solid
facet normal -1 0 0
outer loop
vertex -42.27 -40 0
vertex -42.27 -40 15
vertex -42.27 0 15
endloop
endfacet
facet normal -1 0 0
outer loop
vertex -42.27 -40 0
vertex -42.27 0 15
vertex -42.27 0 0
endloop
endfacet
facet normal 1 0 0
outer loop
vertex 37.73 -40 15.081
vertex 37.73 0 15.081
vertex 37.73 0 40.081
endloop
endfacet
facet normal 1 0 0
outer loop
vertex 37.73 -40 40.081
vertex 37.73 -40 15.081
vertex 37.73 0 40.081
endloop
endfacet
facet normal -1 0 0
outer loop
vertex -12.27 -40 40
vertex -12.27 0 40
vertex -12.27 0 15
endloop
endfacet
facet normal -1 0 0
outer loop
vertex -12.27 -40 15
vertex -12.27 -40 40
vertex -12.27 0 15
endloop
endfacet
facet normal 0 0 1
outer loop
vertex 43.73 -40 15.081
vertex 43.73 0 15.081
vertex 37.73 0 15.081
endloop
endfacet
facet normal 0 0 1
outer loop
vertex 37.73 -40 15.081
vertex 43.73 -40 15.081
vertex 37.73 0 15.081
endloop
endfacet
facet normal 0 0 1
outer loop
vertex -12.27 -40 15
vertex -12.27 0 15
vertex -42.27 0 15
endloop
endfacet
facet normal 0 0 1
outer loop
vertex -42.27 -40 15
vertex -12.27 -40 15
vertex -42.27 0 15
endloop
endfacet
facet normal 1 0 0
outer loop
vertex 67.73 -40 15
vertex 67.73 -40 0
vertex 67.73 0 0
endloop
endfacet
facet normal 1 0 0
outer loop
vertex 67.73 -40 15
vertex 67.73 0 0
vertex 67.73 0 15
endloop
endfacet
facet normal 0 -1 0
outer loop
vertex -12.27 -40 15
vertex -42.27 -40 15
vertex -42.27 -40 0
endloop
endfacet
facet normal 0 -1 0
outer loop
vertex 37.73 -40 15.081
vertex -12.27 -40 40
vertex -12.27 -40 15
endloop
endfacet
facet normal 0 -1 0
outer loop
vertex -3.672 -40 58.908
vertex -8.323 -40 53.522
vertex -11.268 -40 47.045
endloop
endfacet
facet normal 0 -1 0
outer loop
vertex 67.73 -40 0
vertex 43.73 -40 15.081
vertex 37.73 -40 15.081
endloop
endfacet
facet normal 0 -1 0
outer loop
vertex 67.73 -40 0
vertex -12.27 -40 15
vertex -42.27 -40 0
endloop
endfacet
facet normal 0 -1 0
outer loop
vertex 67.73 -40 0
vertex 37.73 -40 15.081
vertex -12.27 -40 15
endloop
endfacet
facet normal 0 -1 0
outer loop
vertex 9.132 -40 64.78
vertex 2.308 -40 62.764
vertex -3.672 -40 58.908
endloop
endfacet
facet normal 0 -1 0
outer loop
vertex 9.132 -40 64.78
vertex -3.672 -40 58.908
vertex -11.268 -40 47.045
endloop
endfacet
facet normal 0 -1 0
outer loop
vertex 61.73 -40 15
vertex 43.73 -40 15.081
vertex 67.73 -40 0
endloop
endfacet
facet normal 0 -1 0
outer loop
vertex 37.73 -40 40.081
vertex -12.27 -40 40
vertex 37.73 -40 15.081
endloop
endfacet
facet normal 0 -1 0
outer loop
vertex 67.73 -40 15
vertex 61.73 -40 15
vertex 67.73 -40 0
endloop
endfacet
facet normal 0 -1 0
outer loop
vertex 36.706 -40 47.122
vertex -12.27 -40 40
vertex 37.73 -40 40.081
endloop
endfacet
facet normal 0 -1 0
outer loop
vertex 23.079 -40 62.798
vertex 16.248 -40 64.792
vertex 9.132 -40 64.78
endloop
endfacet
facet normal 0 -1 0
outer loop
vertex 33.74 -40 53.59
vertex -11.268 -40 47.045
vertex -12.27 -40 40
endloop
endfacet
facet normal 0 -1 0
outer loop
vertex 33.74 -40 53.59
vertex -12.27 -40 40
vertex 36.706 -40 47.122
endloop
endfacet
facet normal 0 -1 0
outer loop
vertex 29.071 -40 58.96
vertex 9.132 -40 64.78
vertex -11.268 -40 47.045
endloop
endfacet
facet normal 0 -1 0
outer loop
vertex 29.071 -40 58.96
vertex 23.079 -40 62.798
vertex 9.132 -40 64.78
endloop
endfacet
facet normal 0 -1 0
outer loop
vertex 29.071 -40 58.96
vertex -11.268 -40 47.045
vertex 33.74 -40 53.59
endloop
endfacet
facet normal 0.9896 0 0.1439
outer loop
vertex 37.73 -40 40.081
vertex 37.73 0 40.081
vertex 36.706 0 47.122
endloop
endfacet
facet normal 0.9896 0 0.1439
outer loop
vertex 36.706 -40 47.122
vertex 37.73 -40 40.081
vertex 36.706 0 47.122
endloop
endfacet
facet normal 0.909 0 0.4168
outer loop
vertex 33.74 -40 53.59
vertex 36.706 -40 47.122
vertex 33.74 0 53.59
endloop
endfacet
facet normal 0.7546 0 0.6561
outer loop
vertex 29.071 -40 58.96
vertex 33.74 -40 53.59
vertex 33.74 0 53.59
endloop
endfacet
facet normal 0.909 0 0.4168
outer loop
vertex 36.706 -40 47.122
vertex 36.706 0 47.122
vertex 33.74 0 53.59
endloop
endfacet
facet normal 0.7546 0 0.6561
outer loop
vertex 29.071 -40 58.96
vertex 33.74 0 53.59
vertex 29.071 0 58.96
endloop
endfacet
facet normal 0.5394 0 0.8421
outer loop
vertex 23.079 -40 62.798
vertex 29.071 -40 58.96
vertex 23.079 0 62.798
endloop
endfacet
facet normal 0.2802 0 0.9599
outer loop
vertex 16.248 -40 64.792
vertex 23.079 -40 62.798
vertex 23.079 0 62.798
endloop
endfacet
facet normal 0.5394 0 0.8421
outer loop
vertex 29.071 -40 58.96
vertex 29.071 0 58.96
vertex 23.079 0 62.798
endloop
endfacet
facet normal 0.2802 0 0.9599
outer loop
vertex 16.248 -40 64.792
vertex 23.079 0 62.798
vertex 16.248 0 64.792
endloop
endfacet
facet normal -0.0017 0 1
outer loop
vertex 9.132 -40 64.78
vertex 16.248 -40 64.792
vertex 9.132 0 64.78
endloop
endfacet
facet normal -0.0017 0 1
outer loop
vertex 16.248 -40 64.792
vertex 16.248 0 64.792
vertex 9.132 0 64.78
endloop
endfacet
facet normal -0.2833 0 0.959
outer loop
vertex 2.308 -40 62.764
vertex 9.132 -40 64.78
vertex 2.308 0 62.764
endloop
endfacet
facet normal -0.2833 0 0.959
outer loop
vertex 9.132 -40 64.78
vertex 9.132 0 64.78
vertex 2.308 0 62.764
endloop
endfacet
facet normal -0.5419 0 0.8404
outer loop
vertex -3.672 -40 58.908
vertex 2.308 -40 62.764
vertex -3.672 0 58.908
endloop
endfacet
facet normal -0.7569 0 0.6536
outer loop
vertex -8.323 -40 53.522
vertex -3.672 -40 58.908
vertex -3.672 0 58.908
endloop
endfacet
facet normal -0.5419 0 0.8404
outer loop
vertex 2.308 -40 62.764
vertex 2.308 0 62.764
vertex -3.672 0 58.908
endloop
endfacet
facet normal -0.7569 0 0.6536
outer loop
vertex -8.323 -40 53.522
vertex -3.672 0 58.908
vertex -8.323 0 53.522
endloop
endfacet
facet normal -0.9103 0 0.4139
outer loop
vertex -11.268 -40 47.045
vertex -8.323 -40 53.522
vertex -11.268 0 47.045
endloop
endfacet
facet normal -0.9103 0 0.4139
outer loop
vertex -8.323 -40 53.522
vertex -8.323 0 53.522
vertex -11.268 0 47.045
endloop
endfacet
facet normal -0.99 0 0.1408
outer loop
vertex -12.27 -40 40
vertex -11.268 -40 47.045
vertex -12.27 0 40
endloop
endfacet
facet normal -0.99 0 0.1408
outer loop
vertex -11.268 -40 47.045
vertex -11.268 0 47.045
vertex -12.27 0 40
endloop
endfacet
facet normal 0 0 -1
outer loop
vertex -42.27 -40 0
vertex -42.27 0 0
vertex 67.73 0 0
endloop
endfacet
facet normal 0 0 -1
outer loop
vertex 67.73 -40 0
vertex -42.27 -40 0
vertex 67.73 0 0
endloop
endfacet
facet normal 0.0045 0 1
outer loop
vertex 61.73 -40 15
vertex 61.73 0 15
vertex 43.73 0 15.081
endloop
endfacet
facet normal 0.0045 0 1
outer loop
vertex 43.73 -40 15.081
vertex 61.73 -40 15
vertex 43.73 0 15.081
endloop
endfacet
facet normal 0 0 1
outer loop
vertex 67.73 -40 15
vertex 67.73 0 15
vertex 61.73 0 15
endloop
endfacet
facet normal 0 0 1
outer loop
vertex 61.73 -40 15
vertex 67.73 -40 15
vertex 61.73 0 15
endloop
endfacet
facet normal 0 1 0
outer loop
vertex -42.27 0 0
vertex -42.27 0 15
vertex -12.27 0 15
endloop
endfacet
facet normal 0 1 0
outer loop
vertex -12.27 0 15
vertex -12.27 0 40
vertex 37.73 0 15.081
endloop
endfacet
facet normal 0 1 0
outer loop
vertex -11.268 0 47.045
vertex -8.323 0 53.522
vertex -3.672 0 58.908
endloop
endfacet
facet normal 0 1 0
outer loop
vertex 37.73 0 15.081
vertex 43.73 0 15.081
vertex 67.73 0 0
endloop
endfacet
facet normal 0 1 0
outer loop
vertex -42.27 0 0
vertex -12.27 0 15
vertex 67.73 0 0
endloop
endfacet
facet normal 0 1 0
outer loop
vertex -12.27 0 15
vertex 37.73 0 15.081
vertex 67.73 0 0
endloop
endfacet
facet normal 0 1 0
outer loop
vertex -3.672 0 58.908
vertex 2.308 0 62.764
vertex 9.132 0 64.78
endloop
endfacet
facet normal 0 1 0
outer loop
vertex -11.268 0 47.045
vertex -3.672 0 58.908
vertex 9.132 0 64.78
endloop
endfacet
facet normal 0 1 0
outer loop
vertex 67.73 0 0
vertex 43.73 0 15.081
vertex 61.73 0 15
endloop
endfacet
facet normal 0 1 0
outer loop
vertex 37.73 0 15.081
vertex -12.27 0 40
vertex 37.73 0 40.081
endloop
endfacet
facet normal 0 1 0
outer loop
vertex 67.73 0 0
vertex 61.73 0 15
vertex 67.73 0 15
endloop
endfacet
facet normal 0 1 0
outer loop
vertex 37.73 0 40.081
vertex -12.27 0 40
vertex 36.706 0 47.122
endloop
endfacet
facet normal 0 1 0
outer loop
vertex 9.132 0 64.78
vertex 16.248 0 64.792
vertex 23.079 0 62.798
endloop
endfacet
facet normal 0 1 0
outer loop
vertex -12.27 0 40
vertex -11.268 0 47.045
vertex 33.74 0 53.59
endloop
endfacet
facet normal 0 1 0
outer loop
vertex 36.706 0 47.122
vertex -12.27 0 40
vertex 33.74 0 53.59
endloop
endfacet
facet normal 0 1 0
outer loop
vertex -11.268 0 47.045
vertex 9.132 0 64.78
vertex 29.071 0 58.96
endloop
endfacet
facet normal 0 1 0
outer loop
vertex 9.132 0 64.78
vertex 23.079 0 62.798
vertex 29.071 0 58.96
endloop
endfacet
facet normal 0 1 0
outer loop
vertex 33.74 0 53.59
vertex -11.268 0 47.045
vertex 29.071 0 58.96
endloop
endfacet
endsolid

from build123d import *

# Parameters (mm, degrees)
F0_R     = 14
F0_W     = 11
F0_H     = 7.7
F1_DEPTH = 40


with BuildPart() as f1:
    # F0 (on Front) → F1 (new body)
    with BuildSketch(Plane.XZ):
        Polygon((47.230265, 7.764964), (47.230265, 0), (58.230265, 0), (67.730265, 0), (67.730265, 15), (61.730265, 15), (61.730265, 7.7), align=None)
        Polygon((-42.269735, 15), (-42.269735, 0), (-32.769735, 0), (-32.769735, 7.7), (-36.269735, 7.7), (-36.269735, 15), align=None)
        Polygon((43.730265, 7.780645), (47.230265, 7.764964), (61.730265, 7.7), (61.730265, 15), (43.730265, 15.080645), align=None)
        Polygon((-36.269735, 7.7), (-32.769735, 7.7), (-21.769735, 7.7), (-18.269735, 7.7), (-18.269735, 15), (-36.269735, 15), align=None)
        with BuildLine():
            Line((-21.769735, 7.7), (-21.769735, 0))
            Line((-21.769735, 0), (47.230265, 0))
            Line((47.230265, 0), (47.230265, 7.764964))
            Line((47.230265, 7.764964), (43.730265, 7.780645))
            Line((43.730265, 7.780645), (43.730265, 15.080645))
            Line((43.730265, 15.080645), (37.730265, 15.080645))
            Line((37.730265, 15.080645), (37.730265, 40))
            Line((37.730265, 40), (37.730265, 40.080645))
            ThreePointArc((37.730265, 40.080645), (12.689942, 65.040323), (-12.269735, 40))
            Line((-12.269735, 40), (-12.269735, 15))
            Line((-12.269735, 15), (-18.269735, 15))
            Line((-18.269735, 15), (-18.269735, 7.7))
            Line((-18.269735, 7.7), (-21.769735, 7.7))
        make_face()
        with Locations((12.730265, 40.040323)):
            Circle(F0_R, mode=Mode.SUBTRACT)
        with Locations((12.730265, 40.040323)):
            Circle(F0_R)
        with Locations((-27.269735, 3.85)):
            Rectangle(F0_W, F0_H)
    extrude(amount=F1_DEPTH)


solid = f1.part
